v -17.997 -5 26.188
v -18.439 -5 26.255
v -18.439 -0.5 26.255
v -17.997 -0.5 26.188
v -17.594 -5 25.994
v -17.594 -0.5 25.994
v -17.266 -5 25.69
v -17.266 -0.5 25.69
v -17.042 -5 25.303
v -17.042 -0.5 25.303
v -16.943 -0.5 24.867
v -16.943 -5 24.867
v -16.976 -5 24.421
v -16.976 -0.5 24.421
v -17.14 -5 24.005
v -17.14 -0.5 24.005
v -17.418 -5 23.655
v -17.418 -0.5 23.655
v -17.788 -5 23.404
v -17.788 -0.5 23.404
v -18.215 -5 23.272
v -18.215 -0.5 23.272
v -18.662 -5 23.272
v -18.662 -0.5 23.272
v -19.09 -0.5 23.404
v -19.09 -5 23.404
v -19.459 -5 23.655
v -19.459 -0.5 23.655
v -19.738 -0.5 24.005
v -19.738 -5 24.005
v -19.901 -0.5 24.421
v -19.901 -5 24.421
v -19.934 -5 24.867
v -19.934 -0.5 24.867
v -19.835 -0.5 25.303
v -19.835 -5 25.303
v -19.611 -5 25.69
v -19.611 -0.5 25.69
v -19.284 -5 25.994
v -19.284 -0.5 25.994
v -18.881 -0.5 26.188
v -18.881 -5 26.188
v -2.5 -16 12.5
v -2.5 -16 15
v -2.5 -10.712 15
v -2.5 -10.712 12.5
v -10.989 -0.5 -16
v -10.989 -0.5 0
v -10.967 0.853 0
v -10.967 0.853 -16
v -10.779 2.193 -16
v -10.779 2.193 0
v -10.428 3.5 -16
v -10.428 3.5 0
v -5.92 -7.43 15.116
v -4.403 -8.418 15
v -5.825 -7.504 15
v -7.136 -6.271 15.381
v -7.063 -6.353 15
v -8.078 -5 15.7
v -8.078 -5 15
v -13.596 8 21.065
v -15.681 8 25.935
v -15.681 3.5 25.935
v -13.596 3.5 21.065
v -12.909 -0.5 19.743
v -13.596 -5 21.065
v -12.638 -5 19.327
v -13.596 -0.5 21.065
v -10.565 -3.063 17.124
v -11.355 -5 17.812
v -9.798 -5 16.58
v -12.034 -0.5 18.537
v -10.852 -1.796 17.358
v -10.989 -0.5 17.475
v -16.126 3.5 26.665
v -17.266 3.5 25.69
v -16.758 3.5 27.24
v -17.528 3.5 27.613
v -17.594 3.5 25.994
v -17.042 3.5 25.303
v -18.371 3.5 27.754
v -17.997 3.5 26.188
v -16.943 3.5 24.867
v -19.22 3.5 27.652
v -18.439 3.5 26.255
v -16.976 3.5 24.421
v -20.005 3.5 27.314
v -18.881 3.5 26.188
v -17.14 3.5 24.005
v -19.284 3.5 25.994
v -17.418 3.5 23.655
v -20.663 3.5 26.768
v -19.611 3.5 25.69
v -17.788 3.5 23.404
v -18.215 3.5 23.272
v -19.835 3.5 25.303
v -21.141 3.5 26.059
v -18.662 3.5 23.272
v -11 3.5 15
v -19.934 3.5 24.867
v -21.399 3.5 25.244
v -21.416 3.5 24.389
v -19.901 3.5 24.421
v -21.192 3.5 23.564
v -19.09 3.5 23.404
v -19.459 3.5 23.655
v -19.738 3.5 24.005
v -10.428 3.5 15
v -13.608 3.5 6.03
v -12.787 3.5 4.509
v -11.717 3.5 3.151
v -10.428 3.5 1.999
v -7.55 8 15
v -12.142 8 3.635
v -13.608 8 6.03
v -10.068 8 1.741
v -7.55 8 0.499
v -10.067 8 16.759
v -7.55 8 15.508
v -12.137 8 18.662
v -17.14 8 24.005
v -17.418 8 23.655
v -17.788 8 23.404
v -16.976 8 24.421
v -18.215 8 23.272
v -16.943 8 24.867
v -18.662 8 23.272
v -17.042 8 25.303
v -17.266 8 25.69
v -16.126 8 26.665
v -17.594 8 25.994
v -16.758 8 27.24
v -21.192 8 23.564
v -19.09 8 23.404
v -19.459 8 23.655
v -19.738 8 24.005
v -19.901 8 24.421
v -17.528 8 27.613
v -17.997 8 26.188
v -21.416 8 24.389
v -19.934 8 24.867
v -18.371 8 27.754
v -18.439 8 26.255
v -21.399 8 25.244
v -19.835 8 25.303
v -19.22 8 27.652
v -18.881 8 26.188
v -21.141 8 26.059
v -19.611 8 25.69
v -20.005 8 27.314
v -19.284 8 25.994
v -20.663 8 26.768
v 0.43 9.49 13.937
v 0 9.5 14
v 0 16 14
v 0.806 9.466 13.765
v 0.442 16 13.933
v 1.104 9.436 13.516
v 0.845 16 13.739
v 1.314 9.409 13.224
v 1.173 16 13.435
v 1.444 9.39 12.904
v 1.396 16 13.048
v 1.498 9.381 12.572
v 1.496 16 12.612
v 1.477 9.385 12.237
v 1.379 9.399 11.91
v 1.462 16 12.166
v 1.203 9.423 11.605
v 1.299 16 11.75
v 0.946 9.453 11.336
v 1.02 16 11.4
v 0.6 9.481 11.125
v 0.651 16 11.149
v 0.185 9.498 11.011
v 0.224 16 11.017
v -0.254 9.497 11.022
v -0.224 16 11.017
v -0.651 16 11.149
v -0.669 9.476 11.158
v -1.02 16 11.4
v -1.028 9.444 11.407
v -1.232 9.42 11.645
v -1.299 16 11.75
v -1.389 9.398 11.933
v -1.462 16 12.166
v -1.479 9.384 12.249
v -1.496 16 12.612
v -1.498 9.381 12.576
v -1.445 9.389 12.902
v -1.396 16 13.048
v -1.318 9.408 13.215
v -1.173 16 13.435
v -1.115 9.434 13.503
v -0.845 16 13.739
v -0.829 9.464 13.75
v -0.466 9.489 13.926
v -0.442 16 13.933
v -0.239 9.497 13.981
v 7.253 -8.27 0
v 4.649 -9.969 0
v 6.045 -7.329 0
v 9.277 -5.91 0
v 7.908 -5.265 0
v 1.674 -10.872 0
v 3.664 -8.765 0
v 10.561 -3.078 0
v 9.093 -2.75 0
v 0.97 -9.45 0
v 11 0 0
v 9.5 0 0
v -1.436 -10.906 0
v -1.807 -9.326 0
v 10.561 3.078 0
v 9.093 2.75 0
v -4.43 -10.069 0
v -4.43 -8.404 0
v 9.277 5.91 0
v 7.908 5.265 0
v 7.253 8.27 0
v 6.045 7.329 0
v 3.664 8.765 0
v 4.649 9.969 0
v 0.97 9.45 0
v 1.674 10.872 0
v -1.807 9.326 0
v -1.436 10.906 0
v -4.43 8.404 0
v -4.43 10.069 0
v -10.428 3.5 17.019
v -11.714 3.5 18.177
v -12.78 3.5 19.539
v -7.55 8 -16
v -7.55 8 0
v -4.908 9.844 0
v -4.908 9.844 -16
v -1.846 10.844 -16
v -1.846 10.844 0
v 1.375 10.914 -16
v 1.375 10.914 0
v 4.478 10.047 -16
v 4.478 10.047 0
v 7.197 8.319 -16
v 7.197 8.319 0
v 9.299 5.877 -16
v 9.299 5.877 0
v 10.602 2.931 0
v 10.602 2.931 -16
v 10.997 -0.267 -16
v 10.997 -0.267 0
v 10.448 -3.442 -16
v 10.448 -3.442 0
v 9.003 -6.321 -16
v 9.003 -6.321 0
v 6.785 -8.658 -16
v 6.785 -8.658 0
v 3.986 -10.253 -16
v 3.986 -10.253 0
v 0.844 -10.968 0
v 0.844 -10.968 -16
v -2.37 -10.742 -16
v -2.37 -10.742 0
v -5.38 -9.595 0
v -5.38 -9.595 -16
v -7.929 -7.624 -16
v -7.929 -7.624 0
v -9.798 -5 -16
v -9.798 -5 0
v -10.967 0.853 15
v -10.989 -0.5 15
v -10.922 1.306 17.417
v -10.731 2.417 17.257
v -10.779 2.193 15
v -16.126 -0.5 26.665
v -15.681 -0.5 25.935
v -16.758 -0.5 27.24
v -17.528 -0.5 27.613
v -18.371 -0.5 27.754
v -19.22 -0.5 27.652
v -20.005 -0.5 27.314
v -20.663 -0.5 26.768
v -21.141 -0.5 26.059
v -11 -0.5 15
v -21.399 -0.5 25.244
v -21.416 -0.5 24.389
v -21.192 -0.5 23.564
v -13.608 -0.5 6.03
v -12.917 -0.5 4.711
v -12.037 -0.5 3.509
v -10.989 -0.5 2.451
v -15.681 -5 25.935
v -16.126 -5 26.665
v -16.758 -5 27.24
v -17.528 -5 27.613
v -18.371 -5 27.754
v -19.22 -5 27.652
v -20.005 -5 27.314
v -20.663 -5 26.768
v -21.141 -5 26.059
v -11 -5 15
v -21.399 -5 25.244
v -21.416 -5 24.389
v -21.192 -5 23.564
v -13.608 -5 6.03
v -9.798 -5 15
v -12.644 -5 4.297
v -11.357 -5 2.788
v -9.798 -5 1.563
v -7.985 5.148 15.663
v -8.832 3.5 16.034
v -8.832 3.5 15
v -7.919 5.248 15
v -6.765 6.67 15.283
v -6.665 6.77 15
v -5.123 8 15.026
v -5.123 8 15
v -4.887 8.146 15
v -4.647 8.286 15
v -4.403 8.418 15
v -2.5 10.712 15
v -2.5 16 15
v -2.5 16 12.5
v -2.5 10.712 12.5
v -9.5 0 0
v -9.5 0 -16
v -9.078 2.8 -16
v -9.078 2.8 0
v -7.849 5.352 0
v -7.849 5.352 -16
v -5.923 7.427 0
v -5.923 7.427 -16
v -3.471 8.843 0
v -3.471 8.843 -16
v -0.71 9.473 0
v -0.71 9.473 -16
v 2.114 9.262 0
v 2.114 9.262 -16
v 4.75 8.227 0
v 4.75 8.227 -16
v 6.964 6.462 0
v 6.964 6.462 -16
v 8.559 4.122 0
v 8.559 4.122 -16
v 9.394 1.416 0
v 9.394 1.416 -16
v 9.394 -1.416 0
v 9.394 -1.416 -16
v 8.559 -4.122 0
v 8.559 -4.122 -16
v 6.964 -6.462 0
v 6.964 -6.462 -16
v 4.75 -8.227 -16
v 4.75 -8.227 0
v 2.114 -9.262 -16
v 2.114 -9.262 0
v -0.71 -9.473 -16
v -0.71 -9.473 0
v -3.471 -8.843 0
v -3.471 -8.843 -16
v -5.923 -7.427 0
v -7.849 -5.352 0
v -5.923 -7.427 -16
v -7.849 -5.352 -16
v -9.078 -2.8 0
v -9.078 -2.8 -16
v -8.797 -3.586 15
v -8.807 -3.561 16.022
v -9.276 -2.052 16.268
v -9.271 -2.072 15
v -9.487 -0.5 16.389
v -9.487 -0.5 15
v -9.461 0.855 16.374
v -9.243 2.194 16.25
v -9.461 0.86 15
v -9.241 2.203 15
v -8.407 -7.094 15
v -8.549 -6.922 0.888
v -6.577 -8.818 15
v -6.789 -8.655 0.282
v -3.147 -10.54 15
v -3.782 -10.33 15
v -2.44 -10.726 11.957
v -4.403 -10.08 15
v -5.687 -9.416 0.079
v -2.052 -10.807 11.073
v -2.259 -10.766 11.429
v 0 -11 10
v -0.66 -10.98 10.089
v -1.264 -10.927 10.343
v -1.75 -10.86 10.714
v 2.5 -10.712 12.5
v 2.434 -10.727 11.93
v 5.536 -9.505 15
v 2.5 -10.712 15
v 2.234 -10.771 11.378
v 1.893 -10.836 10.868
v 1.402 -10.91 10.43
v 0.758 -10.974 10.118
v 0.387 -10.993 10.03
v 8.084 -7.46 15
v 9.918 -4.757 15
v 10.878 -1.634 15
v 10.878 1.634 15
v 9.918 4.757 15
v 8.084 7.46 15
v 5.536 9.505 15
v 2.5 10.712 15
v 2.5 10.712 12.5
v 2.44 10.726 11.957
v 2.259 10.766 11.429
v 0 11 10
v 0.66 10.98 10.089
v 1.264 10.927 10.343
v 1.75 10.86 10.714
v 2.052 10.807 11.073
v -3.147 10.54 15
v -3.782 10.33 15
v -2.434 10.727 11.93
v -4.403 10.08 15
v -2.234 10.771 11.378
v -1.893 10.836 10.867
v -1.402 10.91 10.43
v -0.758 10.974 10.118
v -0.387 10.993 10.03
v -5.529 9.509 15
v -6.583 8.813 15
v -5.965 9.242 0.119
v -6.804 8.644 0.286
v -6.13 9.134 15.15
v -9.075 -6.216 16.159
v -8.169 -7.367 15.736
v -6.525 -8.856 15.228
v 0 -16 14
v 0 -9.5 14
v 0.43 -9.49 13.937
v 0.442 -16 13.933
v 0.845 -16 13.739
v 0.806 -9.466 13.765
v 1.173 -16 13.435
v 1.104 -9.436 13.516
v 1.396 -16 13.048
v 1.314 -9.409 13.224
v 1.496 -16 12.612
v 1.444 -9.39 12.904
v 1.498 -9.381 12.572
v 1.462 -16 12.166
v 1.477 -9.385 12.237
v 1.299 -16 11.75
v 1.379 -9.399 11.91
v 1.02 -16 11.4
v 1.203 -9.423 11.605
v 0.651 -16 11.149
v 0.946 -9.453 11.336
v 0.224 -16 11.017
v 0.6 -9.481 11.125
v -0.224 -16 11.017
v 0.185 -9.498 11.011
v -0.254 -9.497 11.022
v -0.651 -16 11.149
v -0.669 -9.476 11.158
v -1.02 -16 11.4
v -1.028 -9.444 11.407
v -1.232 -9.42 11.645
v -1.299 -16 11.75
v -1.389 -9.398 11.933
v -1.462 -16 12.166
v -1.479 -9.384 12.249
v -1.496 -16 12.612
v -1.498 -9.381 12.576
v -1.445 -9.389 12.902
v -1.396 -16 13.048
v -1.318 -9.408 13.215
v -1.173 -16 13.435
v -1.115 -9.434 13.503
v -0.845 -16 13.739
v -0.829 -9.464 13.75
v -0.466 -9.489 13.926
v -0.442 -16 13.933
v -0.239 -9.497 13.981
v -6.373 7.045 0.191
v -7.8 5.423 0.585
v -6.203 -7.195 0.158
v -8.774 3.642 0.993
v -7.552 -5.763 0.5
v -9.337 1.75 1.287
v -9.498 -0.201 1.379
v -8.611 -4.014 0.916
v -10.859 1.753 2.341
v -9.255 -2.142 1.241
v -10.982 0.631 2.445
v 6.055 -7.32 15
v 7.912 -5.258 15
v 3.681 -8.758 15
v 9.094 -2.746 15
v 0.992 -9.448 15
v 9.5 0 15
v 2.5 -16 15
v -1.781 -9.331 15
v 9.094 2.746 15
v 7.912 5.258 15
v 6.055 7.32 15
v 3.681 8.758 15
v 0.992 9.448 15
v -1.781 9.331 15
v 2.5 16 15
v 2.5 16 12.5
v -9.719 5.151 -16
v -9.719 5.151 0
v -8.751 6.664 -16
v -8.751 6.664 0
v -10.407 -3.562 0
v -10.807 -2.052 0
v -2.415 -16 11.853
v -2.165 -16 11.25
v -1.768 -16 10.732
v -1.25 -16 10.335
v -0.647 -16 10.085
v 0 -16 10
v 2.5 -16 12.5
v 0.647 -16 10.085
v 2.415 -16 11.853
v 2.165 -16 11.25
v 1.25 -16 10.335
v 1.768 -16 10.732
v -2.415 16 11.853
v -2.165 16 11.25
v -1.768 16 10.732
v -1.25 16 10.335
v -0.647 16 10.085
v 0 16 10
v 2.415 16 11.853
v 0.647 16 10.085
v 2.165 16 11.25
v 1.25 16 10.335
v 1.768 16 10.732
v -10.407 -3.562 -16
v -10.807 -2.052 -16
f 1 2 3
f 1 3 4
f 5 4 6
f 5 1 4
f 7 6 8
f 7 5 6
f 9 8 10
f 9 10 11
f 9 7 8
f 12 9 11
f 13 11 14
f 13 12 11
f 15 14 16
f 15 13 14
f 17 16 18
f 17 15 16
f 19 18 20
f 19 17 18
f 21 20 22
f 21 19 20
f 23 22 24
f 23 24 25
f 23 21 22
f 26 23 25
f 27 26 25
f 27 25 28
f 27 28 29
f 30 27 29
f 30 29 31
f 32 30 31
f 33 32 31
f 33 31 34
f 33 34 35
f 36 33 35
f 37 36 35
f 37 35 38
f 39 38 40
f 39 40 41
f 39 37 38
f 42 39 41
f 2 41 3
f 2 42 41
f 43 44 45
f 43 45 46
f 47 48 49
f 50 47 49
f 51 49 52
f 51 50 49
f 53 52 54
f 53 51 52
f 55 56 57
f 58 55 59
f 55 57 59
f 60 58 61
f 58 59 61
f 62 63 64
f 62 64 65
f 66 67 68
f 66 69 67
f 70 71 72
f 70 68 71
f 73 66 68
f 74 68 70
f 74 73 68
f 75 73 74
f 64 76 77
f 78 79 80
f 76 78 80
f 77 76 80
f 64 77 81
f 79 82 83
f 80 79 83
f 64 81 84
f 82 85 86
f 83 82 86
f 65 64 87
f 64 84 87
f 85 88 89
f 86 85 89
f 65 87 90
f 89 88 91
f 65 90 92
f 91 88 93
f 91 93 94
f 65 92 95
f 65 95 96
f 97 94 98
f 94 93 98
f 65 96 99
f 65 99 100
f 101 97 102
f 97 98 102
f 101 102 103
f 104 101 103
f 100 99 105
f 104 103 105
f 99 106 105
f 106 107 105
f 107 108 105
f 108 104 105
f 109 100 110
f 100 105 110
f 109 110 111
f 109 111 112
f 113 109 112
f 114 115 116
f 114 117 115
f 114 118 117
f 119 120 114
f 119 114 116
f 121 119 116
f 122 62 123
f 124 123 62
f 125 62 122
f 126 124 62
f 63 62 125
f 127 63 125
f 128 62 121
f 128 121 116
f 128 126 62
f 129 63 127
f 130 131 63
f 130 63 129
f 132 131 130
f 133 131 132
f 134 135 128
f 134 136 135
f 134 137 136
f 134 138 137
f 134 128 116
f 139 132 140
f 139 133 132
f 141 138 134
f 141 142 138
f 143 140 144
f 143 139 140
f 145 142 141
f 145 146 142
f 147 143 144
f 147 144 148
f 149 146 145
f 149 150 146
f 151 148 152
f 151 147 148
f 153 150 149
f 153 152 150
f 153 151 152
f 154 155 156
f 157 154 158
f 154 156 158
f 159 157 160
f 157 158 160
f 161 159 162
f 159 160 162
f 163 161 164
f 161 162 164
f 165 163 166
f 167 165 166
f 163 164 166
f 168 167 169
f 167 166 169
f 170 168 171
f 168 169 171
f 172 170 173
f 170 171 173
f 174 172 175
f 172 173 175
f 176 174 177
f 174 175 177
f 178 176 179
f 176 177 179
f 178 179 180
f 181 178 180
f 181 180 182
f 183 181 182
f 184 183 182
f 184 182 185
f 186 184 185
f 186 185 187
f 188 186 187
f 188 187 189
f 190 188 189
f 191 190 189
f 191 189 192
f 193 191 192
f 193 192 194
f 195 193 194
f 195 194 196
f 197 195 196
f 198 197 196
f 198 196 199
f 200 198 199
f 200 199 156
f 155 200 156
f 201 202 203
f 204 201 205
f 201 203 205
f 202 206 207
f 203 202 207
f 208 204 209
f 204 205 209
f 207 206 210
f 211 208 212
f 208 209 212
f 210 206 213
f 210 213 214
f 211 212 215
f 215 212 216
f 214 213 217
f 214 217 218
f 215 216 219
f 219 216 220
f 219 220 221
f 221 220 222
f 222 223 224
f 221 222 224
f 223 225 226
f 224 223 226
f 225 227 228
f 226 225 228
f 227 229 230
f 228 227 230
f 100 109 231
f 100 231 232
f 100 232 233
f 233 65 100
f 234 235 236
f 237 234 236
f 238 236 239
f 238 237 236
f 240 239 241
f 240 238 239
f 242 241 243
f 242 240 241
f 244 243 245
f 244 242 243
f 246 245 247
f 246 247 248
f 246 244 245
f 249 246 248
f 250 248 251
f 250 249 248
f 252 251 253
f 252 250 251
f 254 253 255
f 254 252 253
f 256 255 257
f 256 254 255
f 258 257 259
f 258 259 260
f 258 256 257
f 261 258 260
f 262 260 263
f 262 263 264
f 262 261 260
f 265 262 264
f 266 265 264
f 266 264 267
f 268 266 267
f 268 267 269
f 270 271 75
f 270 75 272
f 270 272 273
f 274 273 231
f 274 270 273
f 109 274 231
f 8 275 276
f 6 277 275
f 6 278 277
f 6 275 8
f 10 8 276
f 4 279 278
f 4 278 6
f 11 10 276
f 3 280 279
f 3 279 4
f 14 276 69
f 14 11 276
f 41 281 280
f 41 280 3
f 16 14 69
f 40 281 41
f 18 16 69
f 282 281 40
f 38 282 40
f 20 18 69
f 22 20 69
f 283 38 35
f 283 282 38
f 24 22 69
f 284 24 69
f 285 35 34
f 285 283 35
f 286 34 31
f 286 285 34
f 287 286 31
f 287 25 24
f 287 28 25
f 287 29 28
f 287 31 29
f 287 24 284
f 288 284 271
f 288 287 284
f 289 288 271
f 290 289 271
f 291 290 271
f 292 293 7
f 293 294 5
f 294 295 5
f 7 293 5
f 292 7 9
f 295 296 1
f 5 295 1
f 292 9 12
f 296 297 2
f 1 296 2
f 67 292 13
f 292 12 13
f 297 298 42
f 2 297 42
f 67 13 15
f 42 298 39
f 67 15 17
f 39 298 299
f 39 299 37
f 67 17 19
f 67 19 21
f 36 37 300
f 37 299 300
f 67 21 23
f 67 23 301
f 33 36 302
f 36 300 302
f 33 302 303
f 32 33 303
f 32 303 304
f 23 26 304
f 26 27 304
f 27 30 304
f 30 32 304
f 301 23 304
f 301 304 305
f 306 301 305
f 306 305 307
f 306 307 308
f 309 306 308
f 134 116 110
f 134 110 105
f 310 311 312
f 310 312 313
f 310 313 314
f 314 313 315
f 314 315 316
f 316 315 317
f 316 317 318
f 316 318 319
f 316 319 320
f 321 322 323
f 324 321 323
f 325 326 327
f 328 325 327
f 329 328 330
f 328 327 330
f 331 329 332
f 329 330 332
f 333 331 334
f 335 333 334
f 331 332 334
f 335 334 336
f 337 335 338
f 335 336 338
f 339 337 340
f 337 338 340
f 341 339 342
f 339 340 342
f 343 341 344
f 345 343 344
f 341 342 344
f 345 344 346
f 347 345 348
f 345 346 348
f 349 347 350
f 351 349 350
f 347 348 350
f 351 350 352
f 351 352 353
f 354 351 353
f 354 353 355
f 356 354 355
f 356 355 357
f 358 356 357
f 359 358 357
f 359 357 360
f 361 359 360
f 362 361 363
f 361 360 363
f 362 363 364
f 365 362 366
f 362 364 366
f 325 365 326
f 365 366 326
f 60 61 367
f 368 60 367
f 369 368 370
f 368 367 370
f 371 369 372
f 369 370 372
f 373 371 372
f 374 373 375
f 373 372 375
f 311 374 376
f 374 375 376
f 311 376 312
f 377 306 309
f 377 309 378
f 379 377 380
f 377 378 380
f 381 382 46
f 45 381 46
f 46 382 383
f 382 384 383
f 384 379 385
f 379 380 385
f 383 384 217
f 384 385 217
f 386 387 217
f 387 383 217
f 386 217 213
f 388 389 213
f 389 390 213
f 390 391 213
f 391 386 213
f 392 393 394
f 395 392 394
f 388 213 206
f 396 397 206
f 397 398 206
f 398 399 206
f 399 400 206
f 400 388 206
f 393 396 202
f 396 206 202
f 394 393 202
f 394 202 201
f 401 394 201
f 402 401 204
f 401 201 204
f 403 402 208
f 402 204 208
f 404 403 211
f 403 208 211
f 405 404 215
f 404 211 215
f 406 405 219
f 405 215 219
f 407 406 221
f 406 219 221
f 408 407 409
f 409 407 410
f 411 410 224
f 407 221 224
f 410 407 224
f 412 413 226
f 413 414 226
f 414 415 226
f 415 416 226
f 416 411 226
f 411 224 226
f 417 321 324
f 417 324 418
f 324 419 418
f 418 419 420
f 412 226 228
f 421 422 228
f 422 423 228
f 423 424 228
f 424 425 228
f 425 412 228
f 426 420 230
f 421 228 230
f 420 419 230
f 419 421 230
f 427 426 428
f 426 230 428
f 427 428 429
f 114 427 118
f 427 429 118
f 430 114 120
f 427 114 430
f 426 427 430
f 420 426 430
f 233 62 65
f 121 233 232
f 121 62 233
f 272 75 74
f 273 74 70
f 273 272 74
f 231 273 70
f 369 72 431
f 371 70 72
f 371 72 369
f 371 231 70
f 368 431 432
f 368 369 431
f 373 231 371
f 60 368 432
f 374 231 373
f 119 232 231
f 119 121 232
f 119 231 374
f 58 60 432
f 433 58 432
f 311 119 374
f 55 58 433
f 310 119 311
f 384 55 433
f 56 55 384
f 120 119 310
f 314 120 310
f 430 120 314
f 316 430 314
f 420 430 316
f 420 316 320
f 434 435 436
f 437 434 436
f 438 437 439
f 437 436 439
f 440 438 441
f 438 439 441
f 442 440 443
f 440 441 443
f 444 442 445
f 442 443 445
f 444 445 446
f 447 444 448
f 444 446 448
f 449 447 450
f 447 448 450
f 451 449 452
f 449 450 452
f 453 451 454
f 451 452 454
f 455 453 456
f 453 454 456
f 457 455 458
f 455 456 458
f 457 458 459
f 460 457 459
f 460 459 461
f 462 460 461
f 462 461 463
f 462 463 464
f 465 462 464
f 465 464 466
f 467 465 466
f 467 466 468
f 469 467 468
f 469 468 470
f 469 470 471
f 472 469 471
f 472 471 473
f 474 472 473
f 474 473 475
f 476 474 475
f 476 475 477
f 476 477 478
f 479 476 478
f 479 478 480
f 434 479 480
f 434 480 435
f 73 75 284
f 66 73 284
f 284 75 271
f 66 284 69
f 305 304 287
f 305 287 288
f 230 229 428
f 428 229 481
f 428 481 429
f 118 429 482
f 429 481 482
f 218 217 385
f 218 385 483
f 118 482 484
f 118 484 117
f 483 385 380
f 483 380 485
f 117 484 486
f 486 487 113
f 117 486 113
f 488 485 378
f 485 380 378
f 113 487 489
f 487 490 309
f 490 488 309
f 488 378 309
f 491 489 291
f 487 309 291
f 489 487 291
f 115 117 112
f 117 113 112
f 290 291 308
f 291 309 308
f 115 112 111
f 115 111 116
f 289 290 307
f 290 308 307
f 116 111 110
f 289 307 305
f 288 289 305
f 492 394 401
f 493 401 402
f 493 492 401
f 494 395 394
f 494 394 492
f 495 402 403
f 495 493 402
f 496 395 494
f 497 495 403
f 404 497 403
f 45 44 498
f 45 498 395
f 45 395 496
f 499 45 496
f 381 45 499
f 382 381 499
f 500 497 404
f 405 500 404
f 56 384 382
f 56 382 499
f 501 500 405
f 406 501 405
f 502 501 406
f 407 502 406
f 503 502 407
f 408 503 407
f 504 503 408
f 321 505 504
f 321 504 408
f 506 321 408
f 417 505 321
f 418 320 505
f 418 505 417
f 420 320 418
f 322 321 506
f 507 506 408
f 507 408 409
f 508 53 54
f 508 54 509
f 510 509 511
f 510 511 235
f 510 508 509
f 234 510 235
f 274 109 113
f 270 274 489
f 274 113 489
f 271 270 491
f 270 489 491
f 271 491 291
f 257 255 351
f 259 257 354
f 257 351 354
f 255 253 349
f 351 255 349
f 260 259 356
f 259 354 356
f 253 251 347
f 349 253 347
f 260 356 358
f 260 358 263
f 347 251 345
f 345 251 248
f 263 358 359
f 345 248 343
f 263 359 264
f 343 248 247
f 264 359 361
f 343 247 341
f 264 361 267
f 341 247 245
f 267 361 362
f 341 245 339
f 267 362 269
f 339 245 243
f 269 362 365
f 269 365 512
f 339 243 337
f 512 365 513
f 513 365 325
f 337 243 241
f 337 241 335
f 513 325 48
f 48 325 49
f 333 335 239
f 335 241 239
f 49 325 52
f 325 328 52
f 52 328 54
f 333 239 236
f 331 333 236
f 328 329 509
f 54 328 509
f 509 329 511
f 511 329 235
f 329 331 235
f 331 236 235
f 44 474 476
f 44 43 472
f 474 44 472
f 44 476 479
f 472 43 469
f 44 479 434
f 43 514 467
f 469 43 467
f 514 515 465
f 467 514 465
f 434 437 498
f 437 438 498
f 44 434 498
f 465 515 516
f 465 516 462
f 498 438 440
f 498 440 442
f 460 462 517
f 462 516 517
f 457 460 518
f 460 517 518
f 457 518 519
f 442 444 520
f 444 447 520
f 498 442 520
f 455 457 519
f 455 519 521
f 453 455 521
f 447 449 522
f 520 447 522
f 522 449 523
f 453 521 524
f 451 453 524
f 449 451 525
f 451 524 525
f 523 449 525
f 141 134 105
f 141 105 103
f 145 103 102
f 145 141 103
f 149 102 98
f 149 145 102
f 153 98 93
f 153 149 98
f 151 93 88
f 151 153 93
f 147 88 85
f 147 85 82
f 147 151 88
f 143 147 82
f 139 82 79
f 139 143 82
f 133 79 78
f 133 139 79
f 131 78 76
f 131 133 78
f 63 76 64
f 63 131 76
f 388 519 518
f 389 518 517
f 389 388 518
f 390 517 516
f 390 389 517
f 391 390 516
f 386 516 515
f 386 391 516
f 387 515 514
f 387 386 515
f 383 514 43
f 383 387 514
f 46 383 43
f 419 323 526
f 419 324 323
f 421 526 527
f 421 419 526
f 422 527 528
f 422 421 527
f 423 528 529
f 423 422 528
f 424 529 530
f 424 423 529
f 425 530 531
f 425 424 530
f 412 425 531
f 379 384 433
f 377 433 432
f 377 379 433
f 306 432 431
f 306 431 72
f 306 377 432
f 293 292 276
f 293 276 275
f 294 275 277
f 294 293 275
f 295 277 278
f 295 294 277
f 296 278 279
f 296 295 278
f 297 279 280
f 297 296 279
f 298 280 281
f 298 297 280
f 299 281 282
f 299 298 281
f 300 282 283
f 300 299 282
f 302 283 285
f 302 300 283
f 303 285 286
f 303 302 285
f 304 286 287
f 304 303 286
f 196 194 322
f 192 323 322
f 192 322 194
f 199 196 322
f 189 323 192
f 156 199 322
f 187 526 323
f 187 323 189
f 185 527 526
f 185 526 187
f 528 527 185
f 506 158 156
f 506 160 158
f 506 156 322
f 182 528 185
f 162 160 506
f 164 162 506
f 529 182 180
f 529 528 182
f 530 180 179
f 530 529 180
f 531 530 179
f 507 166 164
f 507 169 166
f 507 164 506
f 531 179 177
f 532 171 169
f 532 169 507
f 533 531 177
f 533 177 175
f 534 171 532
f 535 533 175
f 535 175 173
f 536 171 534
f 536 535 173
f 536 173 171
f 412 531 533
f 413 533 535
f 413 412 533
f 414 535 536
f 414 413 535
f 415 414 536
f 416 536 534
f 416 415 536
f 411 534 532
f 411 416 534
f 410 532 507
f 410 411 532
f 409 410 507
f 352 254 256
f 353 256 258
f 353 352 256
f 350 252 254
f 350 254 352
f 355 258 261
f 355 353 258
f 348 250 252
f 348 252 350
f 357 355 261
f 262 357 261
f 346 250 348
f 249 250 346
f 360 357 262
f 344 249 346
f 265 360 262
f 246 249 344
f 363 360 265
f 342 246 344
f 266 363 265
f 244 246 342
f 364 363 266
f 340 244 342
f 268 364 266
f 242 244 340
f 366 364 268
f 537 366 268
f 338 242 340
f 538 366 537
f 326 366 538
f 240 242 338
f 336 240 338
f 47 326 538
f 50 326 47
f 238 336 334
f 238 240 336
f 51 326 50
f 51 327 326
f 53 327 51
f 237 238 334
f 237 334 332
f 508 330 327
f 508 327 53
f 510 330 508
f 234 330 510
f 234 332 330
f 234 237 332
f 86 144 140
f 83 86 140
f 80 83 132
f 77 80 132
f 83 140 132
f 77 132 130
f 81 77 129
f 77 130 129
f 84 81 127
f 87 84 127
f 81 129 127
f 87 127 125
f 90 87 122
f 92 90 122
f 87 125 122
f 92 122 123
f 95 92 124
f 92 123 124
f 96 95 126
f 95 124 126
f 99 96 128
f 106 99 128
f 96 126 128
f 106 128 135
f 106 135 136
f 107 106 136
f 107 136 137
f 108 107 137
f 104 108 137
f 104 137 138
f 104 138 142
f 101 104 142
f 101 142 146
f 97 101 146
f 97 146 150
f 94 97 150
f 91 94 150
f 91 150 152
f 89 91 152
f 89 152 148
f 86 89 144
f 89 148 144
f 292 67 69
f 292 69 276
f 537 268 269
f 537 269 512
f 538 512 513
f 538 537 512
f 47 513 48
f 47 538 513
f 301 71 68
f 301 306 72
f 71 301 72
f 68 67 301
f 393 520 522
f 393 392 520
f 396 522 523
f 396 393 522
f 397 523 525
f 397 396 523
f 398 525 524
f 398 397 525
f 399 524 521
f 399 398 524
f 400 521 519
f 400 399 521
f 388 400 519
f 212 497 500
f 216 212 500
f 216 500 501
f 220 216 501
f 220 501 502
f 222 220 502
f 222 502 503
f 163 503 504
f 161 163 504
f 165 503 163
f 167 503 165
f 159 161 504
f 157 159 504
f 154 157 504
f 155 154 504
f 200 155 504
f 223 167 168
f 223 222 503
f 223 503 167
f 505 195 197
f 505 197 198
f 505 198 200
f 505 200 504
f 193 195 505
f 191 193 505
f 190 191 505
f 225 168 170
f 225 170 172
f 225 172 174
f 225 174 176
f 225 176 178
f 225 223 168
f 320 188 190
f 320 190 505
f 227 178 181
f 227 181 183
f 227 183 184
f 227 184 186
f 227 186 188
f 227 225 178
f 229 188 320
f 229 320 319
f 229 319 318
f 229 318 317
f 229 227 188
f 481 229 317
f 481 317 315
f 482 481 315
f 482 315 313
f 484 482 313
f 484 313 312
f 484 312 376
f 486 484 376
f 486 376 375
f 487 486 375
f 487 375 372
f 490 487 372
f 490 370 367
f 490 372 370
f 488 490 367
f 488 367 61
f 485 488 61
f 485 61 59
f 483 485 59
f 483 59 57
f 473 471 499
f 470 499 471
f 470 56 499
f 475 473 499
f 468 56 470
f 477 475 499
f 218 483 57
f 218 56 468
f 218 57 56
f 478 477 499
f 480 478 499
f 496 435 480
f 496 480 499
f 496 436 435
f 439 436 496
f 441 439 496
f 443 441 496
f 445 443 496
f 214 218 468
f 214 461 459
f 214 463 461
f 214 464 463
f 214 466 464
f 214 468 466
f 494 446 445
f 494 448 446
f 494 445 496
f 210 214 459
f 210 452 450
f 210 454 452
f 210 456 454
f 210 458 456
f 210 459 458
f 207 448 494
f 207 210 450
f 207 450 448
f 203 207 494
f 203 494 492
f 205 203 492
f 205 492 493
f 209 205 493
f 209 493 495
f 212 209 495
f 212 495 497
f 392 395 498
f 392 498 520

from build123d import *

# Parameters (mm, degrees)
CROQUIS1_R                   = 11
CROQUIS1_R_2                 = 9.5
SALIENTE_EXTRUIR1_DEPTH      = 15
SALIENTE_EXTRUIR2_REACH      = 34.787
SALIENTE_EXTRUIR2_END_RADIUS = 11
CROQUIS2_W                   = 5
CROQUIS2_H                   = 5
SALIENTE_EXTRUIR3_REACH      = 39.014
SALIENTE_EXTRUIR3_END_RADIUS = 11
CROQUIS3_W                   = 5
CROQUIS3_H                   = 5
CORTAR_EXTRUIR1_REACH        = 39.014
CROQUIS4_R                   = 1.5
REDONDEO1_R                  = 2.5
CROQUIS5_R                   = 1.5
SALIENTE_EXTRUIR4_DEPTH      = 4.5
SALIENTE_EXTRUIR5_REACH      = 40.863
CROQUIS6_W                   = 15
CROQUIS6_H                   = 4.5
CROQUIS7_R                   = 1.5
SALIENTE_EXTRUIR6_DEPTH      = 4.5
SALIENTE_EXTRUIR7_REACH      = 40.863
SALIENTE_EXTRUIR7_END_RADIUS = 11
CROQUIS8_W                   = 15
CROQUIS8_H                   = 4.5
REDONDEO4_R                  = 10
CROQUIS17_R                  = 9.5
SALIENTE_EXTRUIR13_DEPTH     = 16
REDONDEO5_R                  = 10


# Some blends are built 0.0001 mm under size
with BuildPart() as part:
    # Croquis1 → Saliente-Extruir1 (new body)
    with BuildSketch(Plane.XY):
        Circle(CROQUIS1_R)
        Circle(CROQUIS1_R_2, mode=Mode.SUBTRACT)
    extrude(amount=SALIENTE_EXTRUIR1_DEPTH)

    # Saliente-Extruir2: up to this cylinder (the profile starts outside it)
    saliente_extruir2_end = Plane(origin=(0, 0, 12.5), z_dir=(0, 0, -1)) * Cylinder(SALIENTE_EXTRUIR2_END_RADIUS, 92.574, mode=Mode.PRIVATE)
    # Croquis2 → Saliente-Extruir2 (add, up to the surface)
    with BuildSketch(Plane(origin=(0, 16, 0), x_dir=(1, 0, 0), z_dir=(0, 1, 0)), mode=Mode.PRIVATE) as saliente_extruir2_sk1:
        with Locations((0, -12.5)):
            Rectangle(CROQUIS2_W, CROQUIS2_H)
    saliente_extruir2_tool1 = extrude(saliente_extruir2_sk1.sketch, amount=-SALIENTE_EXTRUIR2_REACH, mode=Mode.PRIVATE) - saliente_extruir2_end
    add(saliente_extruir2_tool1.solids().sort_by_distance((0, 16, 12.5))[0])

    # Saliente-Extruir3: up to this cylinder (the profile starts outside it)
    saliente_extruir3_end = Plane(origin=(0, 0, 12.5), z_dir=(0, 0, -1)) * Cylinder(SALIENTE_EXTRUIR3_END_RADIUS, 101.028, mode=Mode.PRIVATE)
    # Croquis3 → Saliente-Extruir3 (add, up to the surface)
    with BuildSketch(Plane(origin=(0, -16, 0), x_dir=(1, 0, 0), z_dir=(0, 1, 0)), mode=Mode.PRIVATE) as saliente_extruir3_sk1:
        with Locations((0, -12.5)):
            Rectangle(CROQUIS3_W, CROQUIS3_H)
    saliente_extruir3_tool1 = extrude(saliente_extruir3_sk1.sketch, amount=SALIENTE_EXTRUIR3_REACH, mode=Mode.PRIVATE) - saliente_extruir3_end
    add(saliente_extruir3_tool1.solids().sort_by_distance((0, -16, 12.5))[0])

    # Cortar-Extruir1: up to this face of the body (flat: up to its plane)
    cortar_extruir1_end = Plane(part.part.faces().sort_by_distance((0, -16, 12.5))[0])
    # Croquis4 → Cortar-Extruir1 (cut, up to the picked face)
    with BuildSketch(Plane(origin=(0, 16, 0), x_dir=(1, 0, 0), z_dir=(0, 1, 0)), mode=Mode.PRIVATE) as cortar_extruir1_sk1:
        with Locations(Location((0, -12.5, 0), (0, 0, 270))):
            Circle(CROQUIS4_R)
    cortar_extruir1_tool1 = split(extrude(cortar_extruir1_sk1.sketch, amount=-CORTAR_EXTRUIR1_REACH, mode=Mode.PRIVATE), bisect_by=cortar_extruir1_end, keep=Keep.BOTH, mode=Mode.PRIVATE)
    add(cortar_extruir1_tool1.solids().sort_by(Axis((0, 16, 12.5), (0, -1, 0)))[0], mode=Mode.SUBTRACT)

    # Redondeo1
    redondeo1_edges = [part.edges().sort_by_distance(p)[0] for p in [
        (-2.5, -13.356071321, 10),
        (2.5, -13.356071321, 10),
        (-2.5, 13.356071321, 10),
        (2.5, 13.356071321, 10),
    ]]
    fillet(redondeo1_edges, radius=REDONDEO1_R - 0.0001)  # a hair under: the kernel refuses the full size

    # Croquis6 → Saliente-Extruir5 (add, up to next)
    with BuildSketch(Plane(origin=(-11, 0, 0), x_dir=(0, 0, -1), z_dir=(1, 0, 0)), mode=Mode.PRIVATE) as saliente_extruir5_sk1:
        with Locations((-7.5, -2.75)):
            Rectangle(CROQUIS6_W, CROQUIS6_H)
    saliente_extruir5_tool1 = extrude(saliente_extruir5_sk1.sketch, amount=SALIENTE_EXTRUIR5_REACH, mode=Mode.PRIVATE) - part.part


with BuildPart() as body_2:
    # Croquis5 → Saliente-Extruir4 (new body)
    with BuildSketch(Plane(origin=(0, -5, 0), x_dir=(1, 0, 0), z_dir=(0, 1, 0))):
        with BuildLine():
            Line((-11, -15), (-15.680701356, -25.935492506))
            ThreePointArc((-15.680701356, -25.935492506), (-19.62440656, -27.510730169), (-21.192151754, -23.564040489))
            Line((-21.192151754, -23.564040489), (-11, 0))
            Line((-11, 0), (-11, -15))
        make_face()
        with Locations(Location((-18.438678413, -24.755, 0), (0, 0, 270))):
            Circle(CROQUIS5_R, mode=Mode.SUBTRACT)
    extrude(amount=SALIENTE_EXTRUIR4_DEPTH)


with BuildPart() as part_1:
    add(part.part)

    add(body_2.part)  # Saliente-Extruir5 merges body 2
    add(saliente_extruir5_tool1.solids().sort_by_distance((-11, -2.75, 7.5))[0])



with BuildPart() as body_2_2:
    # Croquis7 → Saliente-Extruir6 (new body)
    with BuildSketch(Plane(origin=(0, 8, 0), x_dir=(1, 0, 0), z_dir=(0, 1, 0))):
        with BuildLine():
            Line((-15.680701356, -25.935492506), (-11, -15))
            Line((-11, -15), (-11, 0))
            Line((-11, 0), (-21.192151754, -23.564040489))
            ThreePointArc((-21.192151754, -23.564040489), (-19.62440656, -27.510730169), (-15.680701356, -25.935492506))
        make_face()
        with Locations(Location((-18.438678413, -24.755, 0), (0, 0, 270))):
            Circle(CROQUIS7_R, mode=Mode.SUBTRACT)
    extrude(amount=-SALIENTE_EXTRUIR6_DEPTH)


with BuildPart() as part_2:
    add(part_1.part)

    add(body_2_2.part)  # Saliente-Extruir7 merges body 2 2
    # Saliente-Extruir7: up to this cylinder (the profile starts outside it)
    saliente_extruir7_end = Plane(origin=(0, 0, 7.5), z_dir=(0, 0, -1)) * Cylinder(SALIENTE_EXTRUIR7_END_RADIUS, 104.726, mode=Mode.PRIVATE)
    # Croquis8 → Saliente-Extruir7 (add, up to the surface)
    with BuildSketch(Plane(origin=(-11, 0, 0), x_dir=(0, 0, -1), z_dir=(1, 0, 0)), mode=Mode.PRIVATE) as saliente_extruir7_sk1:
        with Locations((-7.5, 5.75)):
            Rectangle(CROQUIS8_W, CROQUIS8_H)
    saliente_extruir7_tool1 = extrude(saliente_extruir7_sk1.sketch, amount=SALIENTE_EXTRUIR7_REACH, mode=Mode.PRIVATE) - saliente_extruir7_end
    add(saliente_extruir7_tool1.solids().sort_by_distance((-11, 5.75, 7.5))[0])

    # Redondeo4
    # the kernel refuses this fillet: 10 mm, written as the material it adds along each edge
    with BuildSketch(Plane(origin=(-11, 8, 15), x_dir=(1, 0, 0), z_dir=(0, -1, 0))) as redondeo4_piece_1_section:
        with BuildLine():
            CenterArc((REDONDEO4_R * 0.659725391862, REDONDEO4_R), REDONDEO4_R, 203.1723, 66.8277)
            Line((-REDONDEO4_R * 0.259600293631, REDONDEO4_R * 0.606502498111), (0, 0))
            Line((0, 0), (REDONDEO4_R * 0.659725391862, 0))
        make_face()
    redondeo4_piece_1 = extrude(amount=4.5, mode=Mode.PRIVATE)
    redondeo4_piece_1 = redondeo4_piece_1 - Plane(origin=(0, 0, 16.61768541), x_dir=(1, 0, 0), z_dir=(0, 0, -1)) * Cylinder(9.5, 36, mode=Mode.PRIVATE)
    add(redondeo4_piece_1)
    with BuildSketch(Plane(origin=(-11, 24.493134797, 15), x_dir=(1, 0, 0), z_dir=(0, -1, 0))) as redondeo4_piece_2_section:
        with BuildLine():
            CenterArc((REDONDEO4_R * 0.659725391862, REDONDEO4_R), REDONDEO4_R, 203.1723, 66.8277)
            Line((-REDONDEO4_R * 0.259600293631, REDONDEO4_R * 0.606502498111), (0, 0))
            Line((0, 0), (REDONDEO4_R * 0.659725391862, 0))
        make_face()
    redondeo4_piece_2 = extrude(amount=37.486269593, mode=Mode.PRIVATE)
    redondeo4_piece_2 = redondeo4_piece_2 & Plane(origin=(0, 0, 15.105091538), x_dir=(1, 0, 0), z_dir=(0, 0, -1)) * Cylinder(11, 102, mode=Mode.PRIVATE)
    redondeo4_piece_2 = redondeo4_piece_2 - Plane(origin=(0, 0, 15.105091538), x_dir=(1, 0, 0), z_dir=(0, 0, -1)) * Cylinder(9.5, 102, mode=Mode.PRIVATE)
    add(redondeo4_piece_2)
    with BuildSketch(Plane(origin=(-11, 24.493134797, 15), x_dir=(1, 0, 0), z_dir=(0, -1, 0))) as redondeo4_piece_3_section:
        with BuildLine():
            CenterArc((REDONDEO4_R * 0.659725391862, REDONDEO4_R), REDONDEO4_R, 203.1723, 66.8277)
            Line((-REDONDEO4_R * 0.259600293631, REDONDEO4_R * 0.606502498111), (0, 0))
            Line((0, 0), (REDONDEO4_R * 0.659725391862, 0))
        make_face()
    redondeo4_piece_3 = extrude(amount=37.486269593, mode=Mode.PRIVATE)
    redondeo4_piece_3 = split(redondeo4_piece_3, bisect_by=Plane(origin=(-11.425826718, -5, 17.078004586), z_dir=(0, 1, 0)), keep=Keep.TOP, mode=Mode.PRIVATE)
    redondeo4_piece_3 = split(redondeo4_piece_3, bisect_by=Plane(origin=(-11.425826718, -0.5, 17.078004586), z_dir=(0, -1, 0)), keep=Keep.TOP, mode=Mode.PRIVATE)
    redondeo4_piece_3 = redondeo4_piece_3 - Plane(origin=(0, 0, 17.078004586), x_dir=(1, 0, 0), z_dir=(0, 0, -1)) * Cylinder(9.5, 102, mode=Mode.PRIVATE)
    add(redondeo4_piece_3)

    # Redondeo5
    # the kernel refuses this fillet: 10 mm, written as the material it takes off along each edge
    with BuildSketch(Plane(origin=(-11, -21.425077205, 0), x_dir=(1, 0, 0), z_dir=(0, 1, 0))) as redondeo5_piece_1:
        with BuildLine():
            CenterArc((REDONDEO5_R * 0.657003088186, -REDONDEO5_R), REDONDEO5_R, 90, 66.610075059)
            Line((-REDONDEO5_R * 0.260821358969, -REDONDEO5_R * 0.603013496194), (0, 0))
            Line((0, 0), (REDONDEO5_R * 0.657003088186, 0))
        make_face()
    extrude(amount=37.350154409, mode=Mode.SUBTRACT)


with BuildPart() as body_2_3:
    # Croquis17 → Saliente-Extruir13 (new body)
    with BuildSketch(Plane(origin=(0, 0, -16), x_dir=(-1, 0, 0), z_dir=(0, 0, -1))):
        with BuildLine():
            ThreePointArc((7.549834435, 8), (-10.839118231, -1.874437511), (9.797958971, -5))
            ThreePointArc((9.797958971, -5), (10.63405263, -2.813703017), (10.988630488, -0.5))
            ThreePointArc((10.988630488, -0.5), (10.893645622, 1.525937434), (10.428326807, 3.5))
            ThreePointArc((10.428326807, 3.5), (9.266394683, 5.927388091), (7.549834435, 8))
        make_face()
        Circle(CROQUIS17_R, mode=Mode.SUBTRACT)
    extrude(amount=-SALIENTE_EXTRUIR13_DEPTH)


solid = Compound([part_2.part, body_2_3.part])
